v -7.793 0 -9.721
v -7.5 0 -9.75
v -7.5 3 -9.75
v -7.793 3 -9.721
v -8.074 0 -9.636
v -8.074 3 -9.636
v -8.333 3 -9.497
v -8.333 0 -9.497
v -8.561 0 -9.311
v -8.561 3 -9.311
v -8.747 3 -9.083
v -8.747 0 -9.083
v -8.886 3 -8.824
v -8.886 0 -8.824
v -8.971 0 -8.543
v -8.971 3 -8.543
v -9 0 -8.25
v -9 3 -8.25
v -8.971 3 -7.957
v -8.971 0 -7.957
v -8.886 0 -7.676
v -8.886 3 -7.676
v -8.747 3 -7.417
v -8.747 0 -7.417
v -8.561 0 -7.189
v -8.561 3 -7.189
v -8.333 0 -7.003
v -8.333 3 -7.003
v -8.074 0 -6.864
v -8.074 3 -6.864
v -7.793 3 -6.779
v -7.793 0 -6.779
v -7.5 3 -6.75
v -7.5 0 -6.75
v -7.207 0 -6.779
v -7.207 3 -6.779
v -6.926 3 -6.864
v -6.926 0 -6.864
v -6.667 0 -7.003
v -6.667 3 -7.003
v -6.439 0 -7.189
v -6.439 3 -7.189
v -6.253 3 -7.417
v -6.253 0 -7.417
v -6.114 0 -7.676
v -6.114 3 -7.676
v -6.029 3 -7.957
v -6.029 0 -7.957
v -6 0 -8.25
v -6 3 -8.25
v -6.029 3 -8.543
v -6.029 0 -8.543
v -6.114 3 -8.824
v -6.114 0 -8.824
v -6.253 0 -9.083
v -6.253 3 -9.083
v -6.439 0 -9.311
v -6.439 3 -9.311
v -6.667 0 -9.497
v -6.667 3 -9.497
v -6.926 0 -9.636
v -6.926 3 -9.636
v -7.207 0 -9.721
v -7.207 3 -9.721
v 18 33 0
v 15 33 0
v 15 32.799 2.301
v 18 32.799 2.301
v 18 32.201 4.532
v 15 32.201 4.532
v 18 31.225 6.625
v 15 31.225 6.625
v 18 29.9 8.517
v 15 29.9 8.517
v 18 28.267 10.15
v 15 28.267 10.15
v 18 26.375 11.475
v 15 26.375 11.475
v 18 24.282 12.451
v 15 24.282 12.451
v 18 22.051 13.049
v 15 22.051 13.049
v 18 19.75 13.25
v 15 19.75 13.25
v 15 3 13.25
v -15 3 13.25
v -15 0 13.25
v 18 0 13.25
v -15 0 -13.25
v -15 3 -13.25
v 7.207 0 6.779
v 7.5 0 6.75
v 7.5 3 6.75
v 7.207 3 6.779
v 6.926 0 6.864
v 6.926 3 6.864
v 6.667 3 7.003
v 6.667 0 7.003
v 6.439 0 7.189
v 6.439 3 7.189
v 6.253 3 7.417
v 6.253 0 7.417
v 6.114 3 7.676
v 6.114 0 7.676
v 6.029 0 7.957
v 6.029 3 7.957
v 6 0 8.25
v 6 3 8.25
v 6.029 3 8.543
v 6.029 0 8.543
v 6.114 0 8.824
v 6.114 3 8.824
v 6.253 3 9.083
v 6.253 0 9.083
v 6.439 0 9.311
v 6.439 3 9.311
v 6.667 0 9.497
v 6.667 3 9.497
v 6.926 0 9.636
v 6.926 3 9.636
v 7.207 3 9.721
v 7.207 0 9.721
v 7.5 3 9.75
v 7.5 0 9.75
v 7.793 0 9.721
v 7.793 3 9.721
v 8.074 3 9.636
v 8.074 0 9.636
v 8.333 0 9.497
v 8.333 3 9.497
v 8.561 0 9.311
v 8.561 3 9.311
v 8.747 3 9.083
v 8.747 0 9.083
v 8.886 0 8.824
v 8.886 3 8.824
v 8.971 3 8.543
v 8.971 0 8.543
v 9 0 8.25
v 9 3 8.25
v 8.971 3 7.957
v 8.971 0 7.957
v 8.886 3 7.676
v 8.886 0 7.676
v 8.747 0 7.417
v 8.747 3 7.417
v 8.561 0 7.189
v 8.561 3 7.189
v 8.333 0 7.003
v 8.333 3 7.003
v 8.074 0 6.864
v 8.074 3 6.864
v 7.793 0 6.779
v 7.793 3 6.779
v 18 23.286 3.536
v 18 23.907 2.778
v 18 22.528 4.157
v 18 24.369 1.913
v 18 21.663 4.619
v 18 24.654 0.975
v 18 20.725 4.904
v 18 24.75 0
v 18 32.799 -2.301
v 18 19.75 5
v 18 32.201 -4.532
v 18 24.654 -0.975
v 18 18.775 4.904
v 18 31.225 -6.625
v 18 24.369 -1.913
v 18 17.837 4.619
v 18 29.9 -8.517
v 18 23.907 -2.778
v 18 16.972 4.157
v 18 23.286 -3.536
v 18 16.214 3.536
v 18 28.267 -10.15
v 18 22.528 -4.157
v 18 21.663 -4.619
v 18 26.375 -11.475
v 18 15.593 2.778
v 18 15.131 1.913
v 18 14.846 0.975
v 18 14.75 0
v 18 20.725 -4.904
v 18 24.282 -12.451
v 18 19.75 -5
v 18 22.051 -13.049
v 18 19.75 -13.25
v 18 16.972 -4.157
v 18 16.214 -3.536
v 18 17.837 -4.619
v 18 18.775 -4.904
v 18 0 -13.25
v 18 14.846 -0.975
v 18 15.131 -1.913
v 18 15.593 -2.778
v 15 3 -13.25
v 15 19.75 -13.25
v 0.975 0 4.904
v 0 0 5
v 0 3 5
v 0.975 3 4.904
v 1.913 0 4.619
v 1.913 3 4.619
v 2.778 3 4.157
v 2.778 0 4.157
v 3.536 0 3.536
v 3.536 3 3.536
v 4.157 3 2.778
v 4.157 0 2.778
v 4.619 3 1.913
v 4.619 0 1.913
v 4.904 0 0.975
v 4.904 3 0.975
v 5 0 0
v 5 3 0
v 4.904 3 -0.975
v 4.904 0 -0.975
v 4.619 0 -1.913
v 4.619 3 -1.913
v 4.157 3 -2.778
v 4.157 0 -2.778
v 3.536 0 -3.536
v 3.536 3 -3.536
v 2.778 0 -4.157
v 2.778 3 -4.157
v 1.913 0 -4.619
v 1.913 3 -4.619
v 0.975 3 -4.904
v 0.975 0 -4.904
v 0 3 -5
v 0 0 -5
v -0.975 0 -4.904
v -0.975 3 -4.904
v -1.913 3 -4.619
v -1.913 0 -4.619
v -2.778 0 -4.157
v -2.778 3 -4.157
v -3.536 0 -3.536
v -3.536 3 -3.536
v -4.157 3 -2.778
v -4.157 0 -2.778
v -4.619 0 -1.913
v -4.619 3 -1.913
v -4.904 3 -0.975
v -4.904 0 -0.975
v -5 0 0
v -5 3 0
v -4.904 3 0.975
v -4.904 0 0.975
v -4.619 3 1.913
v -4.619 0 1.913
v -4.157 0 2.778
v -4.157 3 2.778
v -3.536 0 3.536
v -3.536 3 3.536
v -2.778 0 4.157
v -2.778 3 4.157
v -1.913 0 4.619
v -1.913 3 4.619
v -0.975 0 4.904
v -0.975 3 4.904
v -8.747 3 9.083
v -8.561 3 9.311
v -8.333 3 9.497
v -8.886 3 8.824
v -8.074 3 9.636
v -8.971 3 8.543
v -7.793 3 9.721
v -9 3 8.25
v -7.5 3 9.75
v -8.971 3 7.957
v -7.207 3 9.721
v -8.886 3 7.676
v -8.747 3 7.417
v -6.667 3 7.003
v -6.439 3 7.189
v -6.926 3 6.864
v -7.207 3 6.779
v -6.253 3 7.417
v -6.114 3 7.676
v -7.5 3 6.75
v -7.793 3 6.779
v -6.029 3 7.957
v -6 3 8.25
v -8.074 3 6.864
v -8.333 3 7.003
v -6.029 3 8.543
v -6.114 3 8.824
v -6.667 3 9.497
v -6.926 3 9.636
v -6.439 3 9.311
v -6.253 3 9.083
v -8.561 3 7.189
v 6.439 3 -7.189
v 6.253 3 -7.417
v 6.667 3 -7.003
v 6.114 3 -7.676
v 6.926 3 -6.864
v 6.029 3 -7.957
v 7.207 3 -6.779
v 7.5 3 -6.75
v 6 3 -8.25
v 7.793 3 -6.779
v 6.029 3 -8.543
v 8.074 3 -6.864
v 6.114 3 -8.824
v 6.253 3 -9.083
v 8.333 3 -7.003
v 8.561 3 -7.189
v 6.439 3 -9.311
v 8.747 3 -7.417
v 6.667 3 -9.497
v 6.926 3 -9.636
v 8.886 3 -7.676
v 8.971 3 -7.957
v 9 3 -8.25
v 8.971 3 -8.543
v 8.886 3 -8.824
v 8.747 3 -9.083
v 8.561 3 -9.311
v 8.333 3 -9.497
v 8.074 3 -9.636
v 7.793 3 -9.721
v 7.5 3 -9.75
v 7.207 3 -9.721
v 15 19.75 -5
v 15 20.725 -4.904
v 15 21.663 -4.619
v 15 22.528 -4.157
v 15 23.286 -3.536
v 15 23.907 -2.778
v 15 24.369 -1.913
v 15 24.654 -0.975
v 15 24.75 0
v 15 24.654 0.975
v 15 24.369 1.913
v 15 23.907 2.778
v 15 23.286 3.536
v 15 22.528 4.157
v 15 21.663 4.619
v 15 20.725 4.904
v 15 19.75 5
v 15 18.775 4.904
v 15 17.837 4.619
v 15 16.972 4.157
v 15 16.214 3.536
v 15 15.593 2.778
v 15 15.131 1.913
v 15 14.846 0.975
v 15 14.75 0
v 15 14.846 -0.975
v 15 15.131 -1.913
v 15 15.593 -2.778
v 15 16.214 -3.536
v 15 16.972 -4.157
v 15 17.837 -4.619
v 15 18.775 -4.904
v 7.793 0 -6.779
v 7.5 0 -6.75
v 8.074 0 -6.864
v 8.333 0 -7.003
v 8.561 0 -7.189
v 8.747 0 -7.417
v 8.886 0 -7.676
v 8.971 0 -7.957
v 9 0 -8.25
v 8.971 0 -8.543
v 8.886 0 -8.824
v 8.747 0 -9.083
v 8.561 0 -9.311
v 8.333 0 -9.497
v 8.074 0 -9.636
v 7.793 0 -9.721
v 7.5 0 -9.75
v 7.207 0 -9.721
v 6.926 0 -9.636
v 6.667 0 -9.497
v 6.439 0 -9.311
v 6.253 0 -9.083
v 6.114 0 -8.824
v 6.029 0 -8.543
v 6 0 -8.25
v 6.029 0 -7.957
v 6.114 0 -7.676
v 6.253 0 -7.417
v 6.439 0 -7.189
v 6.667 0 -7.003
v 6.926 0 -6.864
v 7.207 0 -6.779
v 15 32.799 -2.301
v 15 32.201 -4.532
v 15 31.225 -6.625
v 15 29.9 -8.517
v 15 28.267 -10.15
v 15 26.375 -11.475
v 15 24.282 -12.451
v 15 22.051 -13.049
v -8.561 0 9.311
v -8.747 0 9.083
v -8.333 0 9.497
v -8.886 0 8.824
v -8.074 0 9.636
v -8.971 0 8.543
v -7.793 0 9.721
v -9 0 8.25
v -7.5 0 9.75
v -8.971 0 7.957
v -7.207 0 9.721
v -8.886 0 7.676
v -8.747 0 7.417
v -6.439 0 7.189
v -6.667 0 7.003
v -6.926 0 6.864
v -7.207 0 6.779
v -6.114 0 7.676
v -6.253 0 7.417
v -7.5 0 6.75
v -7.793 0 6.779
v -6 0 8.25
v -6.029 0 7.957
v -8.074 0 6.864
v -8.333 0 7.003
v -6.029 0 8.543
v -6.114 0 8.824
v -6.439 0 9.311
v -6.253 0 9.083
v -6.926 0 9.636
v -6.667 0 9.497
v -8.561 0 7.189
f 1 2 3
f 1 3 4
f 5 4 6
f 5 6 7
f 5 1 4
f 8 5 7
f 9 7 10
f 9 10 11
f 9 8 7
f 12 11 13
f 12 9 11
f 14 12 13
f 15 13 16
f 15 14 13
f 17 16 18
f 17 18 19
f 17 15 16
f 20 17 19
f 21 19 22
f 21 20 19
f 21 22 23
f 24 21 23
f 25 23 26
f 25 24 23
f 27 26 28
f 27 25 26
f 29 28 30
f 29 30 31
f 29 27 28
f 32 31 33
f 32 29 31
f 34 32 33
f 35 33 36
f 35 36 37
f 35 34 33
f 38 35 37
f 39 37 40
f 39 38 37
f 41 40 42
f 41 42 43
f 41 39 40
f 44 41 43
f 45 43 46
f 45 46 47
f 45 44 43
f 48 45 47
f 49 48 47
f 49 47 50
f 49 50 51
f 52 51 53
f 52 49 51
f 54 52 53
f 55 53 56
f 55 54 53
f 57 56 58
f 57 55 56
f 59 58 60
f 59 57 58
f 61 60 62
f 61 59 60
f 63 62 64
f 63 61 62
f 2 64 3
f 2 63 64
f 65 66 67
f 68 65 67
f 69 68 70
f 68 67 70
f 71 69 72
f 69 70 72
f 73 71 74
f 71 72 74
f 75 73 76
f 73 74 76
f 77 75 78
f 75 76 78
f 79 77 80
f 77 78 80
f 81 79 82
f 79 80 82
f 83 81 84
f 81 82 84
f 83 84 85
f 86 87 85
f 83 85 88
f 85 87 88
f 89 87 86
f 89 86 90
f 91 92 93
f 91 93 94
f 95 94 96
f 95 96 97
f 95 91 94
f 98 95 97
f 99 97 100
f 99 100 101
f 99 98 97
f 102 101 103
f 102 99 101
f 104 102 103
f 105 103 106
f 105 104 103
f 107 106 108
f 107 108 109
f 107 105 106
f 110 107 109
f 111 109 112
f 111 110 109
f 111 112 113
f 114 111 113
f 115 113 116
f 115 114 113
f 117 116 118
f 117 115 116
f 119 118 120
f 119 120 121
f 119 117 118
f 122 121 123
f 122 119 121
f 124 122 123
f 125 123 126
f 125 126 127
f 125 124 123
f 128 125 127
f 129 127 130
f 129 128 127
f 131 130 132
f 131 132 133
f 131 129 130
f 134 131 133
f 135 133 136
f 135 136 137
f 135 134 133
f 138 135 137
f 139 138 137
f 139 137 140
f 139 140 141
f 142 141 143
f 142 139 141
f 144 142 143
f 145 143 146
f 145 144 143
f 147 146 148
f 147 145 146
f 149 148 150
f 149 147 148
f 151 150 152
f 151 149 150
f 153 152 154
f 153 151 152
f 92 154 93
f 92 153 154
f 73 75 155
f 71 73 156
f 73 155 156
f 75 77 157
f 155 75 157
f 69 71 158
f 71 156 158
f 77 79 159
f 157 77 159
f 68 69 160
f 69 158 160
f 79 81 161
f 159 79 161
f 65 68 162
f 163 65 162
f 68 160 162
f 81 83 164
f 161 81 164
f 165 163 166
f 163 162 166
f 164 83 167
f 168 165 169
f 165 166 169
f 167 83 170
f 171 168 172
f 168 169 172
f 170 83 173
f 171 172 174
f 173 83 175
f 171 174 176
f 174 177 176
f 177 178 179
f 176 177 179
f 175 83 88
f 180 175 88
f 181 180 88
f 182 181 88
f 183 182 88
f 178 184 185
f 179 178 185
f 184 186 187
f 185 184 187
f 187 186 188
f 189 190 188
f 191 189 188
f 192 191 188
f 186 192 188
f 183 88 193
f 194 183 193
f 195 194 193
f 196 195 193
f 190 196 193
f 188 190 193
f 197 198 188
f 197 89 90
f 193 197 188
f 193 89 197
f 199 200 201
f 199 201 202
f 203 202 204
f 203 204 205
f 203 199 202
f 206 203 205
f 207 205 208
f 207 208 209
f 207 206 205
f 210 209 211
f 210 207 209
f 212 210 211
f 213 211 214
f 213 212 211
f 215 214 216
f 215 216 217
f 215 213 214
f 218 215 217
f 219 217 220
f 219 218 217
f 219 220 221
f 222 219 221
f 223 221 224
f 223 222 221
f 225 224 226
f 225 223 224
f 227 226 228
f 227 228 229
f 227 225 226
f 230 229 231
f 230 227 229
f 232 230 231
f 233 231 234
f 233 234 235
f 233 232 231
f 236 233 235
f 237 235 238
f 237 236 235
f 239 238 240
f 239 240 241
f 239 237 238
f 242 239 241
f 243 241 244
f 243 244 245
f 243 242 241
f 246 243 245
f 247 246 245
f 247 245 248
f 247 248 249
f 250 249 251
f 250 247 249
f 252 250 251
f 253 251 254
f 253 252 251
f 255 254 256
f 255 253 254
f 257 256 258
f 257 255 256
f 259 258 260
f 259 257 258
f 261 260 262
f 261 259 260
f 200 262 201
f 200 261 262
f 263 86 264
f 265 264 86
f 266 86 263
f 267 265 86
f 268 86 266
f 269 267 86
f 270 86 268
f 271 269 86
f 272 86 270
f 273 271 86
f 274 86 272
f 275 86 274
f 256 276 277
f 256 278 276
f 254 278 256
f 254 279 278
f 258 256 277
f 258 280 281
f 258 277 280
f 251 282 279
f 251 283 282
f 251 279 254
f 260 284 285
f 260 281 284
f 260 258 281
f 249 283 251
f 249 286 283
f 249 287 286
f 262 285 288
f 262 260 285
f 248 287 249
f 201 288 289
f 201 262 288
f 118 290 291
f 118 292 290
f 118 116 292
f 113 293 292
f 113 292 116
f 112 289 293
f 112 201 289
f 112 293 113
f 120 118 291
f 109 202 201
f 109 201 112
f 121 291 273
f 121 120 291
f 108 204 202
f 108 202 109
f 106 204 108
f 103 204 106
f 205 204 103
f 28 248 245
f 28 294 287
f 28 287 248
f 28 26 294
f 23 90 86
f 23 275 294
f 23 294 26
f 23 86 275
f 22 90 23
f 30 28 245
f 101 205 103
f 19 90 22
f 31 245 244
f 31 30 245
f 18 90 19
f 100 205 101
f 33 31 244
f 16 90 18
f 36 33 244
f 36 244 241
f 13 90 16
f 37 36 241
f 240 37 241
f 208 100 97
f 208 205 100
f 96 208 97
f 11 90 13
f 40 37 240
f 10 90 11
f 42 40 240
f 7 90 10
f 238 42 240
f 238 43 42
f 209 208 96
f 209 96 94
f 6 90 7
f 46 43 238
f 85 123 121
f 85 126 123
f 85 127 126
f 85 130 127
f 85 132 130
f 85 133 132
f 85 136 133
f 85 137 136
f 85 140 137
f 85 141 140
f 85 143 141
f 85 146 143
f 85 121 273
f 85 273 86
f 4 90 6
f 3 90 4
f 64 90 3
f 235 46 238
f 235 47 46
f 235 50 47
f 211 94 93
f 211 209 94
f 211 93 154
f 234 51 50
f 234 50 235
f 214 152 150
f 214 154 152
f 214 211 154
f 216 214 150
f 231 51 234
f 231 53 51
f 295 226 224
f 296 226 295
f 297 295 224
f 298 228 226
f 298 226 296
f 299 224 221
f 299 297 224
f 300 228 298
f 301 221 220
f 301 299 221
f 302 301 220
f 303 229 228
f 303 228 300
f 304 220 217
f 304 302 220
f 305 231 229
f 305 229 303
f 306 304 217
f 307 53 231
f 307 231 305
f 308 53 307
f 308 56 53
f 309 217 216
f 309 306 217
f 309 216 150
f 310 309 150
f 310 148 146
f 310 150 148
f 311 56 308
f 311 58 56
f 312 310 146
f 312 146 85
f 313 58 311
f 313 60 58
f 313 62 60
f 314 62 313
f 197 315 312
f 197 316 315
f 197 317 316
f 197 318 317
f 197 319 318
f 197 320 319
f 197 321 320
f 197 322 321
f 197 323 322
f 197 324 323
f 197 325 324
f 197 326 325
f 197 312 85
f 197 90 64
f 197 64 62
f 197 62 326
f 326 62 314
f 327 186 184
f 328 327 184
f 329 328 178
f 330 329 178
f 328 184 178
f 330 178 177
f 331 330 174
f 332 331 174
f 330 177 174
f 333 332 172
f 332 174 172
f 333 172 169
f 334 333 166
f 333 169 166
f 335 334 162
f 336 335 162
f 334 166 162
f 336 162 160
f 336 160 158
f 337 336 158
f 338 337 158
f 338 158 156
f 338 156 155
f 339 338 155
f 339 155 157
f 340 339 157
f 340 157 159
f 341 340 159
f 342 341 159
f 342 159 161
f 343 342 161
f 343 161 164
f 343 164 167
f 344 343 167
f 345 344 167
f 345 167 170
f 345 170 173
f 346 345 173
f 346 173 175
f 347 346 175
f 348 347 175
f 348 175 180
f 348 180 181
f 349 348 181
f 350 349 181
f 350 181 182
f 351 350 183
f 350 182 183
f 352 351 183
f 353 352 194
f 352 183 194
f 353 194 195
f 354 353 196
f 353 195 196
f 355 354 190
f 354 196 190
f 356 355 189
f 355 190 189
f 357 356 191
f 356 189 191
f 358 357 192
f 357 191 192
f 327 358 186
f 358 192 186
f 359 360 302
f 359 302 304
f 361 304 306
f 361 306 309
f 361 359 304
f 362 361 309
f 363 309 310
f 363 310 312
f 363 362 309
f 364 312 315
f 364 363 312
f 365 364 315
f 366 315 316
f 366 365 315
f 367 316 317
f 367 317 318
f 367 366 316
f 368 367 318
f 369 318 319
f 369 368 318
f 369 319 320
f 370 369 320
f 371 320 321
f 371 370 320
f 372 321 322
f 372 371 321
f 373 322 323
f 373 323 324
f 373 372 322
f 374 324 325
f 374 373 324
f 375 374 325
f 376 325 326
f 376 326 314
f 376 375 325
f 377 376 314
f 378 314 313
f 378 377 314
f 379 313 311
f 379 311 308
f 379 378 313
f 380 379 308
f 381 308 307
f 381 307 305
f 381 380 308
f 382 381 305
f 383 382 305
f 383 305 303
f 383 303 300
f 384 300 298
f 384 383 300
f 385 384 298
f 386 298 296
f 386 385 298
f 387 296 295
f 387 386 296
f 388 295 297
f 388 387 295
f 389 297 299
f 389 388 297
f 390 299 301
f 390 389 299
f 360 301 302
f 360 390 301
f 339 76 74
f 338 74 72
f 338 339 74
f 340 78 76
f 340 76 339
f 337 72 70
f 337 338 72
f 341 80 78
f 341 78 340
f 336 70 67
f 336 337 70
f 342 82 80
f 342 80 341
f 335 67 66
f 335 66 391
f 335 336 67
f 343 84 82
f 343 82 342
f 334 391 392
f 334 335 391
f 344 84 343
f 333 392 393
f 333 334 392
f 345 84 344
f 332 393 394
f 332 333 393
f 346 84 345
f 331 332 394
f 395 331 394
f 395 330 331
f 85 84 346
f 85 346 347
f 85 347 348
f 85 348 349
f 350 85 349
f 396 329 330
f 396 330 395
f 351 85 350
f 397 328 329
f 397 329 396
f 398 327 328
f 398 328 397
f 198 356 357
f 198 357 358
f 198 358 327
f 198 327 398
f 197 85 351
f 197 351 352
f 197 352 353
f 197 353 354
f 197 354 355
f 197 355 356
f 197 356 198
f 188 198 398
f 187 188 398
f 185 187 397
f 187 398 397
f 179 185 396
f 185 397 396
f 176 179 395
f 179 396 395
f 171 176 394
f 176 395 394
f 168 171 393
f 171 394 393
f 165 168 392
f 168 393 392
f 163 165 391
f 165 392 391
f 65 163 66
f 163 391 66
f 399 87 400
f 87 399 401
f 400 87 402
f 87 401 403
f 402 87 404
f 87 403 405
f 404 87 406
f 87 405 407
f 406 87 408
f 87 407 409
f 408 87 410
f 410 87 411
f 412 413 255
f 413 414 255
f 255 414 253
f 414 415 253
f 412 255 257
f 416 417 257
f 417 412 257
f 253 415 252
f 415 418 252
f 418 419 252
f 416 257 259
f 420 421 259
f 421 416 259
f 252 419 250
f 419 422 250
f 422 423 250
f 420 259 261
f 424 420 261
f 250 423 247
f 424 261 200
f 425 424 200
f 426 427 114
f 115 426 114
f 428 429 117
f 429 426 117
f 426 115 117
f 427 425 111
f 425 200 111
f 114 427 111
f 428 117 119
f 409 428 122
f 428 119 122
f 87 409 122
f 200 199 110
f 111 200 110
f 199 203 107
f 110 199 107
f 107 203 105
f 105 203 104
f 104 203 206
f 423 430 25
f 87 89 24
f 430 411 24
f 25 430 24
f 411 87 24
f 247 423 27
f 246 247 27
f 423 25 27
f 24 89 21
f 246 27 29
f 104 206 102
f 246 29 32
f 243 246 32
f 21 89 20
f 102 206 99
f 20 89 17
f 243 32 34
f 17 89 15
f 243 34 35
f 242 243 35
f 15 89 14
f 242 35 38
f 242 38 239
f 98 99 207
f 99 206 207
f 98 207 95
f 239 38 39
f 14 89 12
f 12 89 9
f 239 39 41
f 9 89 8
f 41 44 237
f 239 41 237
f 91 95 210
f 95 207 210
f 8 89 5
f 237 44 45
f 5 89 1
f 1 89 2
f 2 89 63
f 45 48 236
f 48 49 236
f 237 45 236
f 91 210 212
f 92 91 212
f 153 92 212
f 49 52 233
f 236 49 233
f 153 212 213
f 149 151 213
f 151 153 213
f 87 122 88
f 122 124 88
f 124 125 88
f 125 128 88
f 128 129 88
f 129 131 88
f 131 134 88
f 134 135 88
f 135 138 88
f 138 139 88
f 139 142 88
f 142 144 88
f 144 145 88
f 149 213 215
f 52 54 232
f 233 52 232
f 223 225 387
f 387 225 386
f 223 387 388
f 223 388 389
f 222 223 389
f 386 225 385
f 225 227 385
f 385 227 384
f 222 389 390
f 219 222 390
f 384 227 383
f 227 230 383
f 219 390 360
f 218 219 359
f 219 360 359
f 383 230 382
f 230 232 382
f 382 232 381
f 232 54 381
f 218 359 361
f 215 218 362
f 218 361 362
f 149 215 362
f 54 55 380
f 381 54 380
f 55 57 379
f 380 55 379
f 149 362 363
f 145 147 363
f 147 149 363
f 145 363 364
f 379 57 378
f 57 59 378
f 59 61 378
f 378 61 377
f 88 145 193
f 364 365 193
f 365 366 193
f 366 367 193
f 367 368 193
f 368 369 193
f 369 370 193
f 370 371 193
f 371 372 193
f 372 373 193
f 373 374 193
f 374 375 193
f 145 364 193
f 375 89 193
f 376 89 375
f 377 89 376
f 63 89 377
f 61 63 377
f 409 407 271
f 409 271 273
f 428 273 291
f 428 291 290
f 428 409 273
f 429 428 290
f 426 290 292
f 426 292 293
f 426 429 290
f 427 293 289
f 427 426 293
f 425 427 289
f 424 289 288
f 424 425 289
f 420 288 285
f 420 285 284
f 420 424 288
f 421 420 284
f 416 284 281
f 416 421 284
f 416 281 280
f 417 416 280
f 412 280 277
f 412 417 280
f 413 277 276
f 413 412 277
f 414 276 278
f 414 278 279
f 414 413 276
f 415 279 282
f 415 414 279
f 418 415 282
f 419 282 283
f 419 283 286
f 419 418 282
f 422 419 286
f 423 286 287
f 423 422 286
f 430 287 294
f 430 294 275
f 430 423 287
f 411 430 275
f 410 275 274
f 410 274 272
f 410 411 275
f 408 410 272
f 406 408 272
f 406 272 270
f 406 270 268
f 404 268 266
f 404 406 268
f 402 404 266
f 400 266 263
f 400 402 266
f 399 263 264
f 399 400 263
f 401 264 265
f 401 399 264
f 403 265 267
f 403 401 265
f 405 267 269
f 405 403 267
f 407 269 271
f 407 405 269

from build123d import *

# Parameters (mm, degrees)
SKETCH1_W           = 30
SKETCH1_H           = 26.5
SKETCH1_R           = 5
SKETCH1_R_2         = 1.5
BOSS_EXTRUDE1_DEPTH = 3
SKETCH2_W           = 3
SKETCH2_H           = 26.5
BOSS_EXTRUDE2_DEPTH = 33
CUT_EXTRUDE1_DEPTH  = 33
SKETCH4_R           = 5
CUT_EXTRUDE2_DEPTH  = 49.513529041


with BuildPart() as part:
    # Sketch1 → Boss-Extrude1 (new body)
    with BuildSketch(Plane(origin=(0, 0, 0), x_dir=(1, 0, 0), z_dir=(0, 1, 0))):
        Rectangle(SKETCH1_W, SKETCH1_H)
        with Locations(Location((0, 0, 0), (0, 0, 270))):
            Circle(SKETCH1_R, mode=Mode.SUBTRACT)
        with Locations(Location((7.5, 8.25, 0), (0, 0, 270))):
            Circle(SKETCH1_R_2, mode=Mode.SUBTRACT)
        with Locations(Location((-7.5, 8.25, 0), (0, 0, 90))):
            Circle(SKETCH1_R_2, mode=Mode.SUBTRACT)
        with Locations(Location((-7.5, -8.25, 0), (0, 0, 270))):
            Circle(SKETCH1_R_2, mode=Mode.SUBTRACT)
        with Locations(Location((7.5, -8.25, 0), (0, 0, 90))):
            Circle(SKETCH1_R_2, mode=Mode.SUBTRACT)
    extrude(amount=BOSS_EXTRUDE1_DEPTH)

    # Sketch2 → Boss-Extrude2 (add)
    with BuildSketch(Plane(origin=(0, 0, 0), x_dir=(1, 0, 0), z_dir=(0, 1, 0))):
        with Locations((16.5, 0)):
            Rectangle(SKETCH2_W, SKETCH2_H)
    extrude(amount=BOSS_EXTRUDE2_DEPTH)

    # Sketch3 → Cut-Extrude1 (cut)
    with BuildSketch(Plane.ZY.offset(-15)):
        with BuildLine():
            Line((0, 33), (-13.25, 33))
            Line((-13.25, 33), (-13.25, 19.75))
            ThreePointArc((-13.25, 19.75), (-9.369164851, 29.119164851), (0, 33))
        make_face()
        with BuildLine():
            Line((13.25, 33), (0, 33))
            ThreePointArc((0, 33), (9.369164851, 29.119164851), (13.25, 19.75))
            Line((13.25, 19.75), (13.25, 33))
        make_face()
    extrude(amount=-CUT_EXTRUDE1_DEPTH, mode=Mode.SUBTRACT)

    # Sketch4 → Cut-Extrude2 (cut, through all)
    with BuildSketch(Plane(origin=(18, 0, 0), x_dir=(0, 0, -1), z_dir=(1, 0, 0))):
        with Locations((0, 19.75)):
            Circle(SKETCH4_R)
    extrude(amount=-CUT_EXTRUDE2_DEPTH, mode=Mode.SUBTRACT)


solid = part.part
